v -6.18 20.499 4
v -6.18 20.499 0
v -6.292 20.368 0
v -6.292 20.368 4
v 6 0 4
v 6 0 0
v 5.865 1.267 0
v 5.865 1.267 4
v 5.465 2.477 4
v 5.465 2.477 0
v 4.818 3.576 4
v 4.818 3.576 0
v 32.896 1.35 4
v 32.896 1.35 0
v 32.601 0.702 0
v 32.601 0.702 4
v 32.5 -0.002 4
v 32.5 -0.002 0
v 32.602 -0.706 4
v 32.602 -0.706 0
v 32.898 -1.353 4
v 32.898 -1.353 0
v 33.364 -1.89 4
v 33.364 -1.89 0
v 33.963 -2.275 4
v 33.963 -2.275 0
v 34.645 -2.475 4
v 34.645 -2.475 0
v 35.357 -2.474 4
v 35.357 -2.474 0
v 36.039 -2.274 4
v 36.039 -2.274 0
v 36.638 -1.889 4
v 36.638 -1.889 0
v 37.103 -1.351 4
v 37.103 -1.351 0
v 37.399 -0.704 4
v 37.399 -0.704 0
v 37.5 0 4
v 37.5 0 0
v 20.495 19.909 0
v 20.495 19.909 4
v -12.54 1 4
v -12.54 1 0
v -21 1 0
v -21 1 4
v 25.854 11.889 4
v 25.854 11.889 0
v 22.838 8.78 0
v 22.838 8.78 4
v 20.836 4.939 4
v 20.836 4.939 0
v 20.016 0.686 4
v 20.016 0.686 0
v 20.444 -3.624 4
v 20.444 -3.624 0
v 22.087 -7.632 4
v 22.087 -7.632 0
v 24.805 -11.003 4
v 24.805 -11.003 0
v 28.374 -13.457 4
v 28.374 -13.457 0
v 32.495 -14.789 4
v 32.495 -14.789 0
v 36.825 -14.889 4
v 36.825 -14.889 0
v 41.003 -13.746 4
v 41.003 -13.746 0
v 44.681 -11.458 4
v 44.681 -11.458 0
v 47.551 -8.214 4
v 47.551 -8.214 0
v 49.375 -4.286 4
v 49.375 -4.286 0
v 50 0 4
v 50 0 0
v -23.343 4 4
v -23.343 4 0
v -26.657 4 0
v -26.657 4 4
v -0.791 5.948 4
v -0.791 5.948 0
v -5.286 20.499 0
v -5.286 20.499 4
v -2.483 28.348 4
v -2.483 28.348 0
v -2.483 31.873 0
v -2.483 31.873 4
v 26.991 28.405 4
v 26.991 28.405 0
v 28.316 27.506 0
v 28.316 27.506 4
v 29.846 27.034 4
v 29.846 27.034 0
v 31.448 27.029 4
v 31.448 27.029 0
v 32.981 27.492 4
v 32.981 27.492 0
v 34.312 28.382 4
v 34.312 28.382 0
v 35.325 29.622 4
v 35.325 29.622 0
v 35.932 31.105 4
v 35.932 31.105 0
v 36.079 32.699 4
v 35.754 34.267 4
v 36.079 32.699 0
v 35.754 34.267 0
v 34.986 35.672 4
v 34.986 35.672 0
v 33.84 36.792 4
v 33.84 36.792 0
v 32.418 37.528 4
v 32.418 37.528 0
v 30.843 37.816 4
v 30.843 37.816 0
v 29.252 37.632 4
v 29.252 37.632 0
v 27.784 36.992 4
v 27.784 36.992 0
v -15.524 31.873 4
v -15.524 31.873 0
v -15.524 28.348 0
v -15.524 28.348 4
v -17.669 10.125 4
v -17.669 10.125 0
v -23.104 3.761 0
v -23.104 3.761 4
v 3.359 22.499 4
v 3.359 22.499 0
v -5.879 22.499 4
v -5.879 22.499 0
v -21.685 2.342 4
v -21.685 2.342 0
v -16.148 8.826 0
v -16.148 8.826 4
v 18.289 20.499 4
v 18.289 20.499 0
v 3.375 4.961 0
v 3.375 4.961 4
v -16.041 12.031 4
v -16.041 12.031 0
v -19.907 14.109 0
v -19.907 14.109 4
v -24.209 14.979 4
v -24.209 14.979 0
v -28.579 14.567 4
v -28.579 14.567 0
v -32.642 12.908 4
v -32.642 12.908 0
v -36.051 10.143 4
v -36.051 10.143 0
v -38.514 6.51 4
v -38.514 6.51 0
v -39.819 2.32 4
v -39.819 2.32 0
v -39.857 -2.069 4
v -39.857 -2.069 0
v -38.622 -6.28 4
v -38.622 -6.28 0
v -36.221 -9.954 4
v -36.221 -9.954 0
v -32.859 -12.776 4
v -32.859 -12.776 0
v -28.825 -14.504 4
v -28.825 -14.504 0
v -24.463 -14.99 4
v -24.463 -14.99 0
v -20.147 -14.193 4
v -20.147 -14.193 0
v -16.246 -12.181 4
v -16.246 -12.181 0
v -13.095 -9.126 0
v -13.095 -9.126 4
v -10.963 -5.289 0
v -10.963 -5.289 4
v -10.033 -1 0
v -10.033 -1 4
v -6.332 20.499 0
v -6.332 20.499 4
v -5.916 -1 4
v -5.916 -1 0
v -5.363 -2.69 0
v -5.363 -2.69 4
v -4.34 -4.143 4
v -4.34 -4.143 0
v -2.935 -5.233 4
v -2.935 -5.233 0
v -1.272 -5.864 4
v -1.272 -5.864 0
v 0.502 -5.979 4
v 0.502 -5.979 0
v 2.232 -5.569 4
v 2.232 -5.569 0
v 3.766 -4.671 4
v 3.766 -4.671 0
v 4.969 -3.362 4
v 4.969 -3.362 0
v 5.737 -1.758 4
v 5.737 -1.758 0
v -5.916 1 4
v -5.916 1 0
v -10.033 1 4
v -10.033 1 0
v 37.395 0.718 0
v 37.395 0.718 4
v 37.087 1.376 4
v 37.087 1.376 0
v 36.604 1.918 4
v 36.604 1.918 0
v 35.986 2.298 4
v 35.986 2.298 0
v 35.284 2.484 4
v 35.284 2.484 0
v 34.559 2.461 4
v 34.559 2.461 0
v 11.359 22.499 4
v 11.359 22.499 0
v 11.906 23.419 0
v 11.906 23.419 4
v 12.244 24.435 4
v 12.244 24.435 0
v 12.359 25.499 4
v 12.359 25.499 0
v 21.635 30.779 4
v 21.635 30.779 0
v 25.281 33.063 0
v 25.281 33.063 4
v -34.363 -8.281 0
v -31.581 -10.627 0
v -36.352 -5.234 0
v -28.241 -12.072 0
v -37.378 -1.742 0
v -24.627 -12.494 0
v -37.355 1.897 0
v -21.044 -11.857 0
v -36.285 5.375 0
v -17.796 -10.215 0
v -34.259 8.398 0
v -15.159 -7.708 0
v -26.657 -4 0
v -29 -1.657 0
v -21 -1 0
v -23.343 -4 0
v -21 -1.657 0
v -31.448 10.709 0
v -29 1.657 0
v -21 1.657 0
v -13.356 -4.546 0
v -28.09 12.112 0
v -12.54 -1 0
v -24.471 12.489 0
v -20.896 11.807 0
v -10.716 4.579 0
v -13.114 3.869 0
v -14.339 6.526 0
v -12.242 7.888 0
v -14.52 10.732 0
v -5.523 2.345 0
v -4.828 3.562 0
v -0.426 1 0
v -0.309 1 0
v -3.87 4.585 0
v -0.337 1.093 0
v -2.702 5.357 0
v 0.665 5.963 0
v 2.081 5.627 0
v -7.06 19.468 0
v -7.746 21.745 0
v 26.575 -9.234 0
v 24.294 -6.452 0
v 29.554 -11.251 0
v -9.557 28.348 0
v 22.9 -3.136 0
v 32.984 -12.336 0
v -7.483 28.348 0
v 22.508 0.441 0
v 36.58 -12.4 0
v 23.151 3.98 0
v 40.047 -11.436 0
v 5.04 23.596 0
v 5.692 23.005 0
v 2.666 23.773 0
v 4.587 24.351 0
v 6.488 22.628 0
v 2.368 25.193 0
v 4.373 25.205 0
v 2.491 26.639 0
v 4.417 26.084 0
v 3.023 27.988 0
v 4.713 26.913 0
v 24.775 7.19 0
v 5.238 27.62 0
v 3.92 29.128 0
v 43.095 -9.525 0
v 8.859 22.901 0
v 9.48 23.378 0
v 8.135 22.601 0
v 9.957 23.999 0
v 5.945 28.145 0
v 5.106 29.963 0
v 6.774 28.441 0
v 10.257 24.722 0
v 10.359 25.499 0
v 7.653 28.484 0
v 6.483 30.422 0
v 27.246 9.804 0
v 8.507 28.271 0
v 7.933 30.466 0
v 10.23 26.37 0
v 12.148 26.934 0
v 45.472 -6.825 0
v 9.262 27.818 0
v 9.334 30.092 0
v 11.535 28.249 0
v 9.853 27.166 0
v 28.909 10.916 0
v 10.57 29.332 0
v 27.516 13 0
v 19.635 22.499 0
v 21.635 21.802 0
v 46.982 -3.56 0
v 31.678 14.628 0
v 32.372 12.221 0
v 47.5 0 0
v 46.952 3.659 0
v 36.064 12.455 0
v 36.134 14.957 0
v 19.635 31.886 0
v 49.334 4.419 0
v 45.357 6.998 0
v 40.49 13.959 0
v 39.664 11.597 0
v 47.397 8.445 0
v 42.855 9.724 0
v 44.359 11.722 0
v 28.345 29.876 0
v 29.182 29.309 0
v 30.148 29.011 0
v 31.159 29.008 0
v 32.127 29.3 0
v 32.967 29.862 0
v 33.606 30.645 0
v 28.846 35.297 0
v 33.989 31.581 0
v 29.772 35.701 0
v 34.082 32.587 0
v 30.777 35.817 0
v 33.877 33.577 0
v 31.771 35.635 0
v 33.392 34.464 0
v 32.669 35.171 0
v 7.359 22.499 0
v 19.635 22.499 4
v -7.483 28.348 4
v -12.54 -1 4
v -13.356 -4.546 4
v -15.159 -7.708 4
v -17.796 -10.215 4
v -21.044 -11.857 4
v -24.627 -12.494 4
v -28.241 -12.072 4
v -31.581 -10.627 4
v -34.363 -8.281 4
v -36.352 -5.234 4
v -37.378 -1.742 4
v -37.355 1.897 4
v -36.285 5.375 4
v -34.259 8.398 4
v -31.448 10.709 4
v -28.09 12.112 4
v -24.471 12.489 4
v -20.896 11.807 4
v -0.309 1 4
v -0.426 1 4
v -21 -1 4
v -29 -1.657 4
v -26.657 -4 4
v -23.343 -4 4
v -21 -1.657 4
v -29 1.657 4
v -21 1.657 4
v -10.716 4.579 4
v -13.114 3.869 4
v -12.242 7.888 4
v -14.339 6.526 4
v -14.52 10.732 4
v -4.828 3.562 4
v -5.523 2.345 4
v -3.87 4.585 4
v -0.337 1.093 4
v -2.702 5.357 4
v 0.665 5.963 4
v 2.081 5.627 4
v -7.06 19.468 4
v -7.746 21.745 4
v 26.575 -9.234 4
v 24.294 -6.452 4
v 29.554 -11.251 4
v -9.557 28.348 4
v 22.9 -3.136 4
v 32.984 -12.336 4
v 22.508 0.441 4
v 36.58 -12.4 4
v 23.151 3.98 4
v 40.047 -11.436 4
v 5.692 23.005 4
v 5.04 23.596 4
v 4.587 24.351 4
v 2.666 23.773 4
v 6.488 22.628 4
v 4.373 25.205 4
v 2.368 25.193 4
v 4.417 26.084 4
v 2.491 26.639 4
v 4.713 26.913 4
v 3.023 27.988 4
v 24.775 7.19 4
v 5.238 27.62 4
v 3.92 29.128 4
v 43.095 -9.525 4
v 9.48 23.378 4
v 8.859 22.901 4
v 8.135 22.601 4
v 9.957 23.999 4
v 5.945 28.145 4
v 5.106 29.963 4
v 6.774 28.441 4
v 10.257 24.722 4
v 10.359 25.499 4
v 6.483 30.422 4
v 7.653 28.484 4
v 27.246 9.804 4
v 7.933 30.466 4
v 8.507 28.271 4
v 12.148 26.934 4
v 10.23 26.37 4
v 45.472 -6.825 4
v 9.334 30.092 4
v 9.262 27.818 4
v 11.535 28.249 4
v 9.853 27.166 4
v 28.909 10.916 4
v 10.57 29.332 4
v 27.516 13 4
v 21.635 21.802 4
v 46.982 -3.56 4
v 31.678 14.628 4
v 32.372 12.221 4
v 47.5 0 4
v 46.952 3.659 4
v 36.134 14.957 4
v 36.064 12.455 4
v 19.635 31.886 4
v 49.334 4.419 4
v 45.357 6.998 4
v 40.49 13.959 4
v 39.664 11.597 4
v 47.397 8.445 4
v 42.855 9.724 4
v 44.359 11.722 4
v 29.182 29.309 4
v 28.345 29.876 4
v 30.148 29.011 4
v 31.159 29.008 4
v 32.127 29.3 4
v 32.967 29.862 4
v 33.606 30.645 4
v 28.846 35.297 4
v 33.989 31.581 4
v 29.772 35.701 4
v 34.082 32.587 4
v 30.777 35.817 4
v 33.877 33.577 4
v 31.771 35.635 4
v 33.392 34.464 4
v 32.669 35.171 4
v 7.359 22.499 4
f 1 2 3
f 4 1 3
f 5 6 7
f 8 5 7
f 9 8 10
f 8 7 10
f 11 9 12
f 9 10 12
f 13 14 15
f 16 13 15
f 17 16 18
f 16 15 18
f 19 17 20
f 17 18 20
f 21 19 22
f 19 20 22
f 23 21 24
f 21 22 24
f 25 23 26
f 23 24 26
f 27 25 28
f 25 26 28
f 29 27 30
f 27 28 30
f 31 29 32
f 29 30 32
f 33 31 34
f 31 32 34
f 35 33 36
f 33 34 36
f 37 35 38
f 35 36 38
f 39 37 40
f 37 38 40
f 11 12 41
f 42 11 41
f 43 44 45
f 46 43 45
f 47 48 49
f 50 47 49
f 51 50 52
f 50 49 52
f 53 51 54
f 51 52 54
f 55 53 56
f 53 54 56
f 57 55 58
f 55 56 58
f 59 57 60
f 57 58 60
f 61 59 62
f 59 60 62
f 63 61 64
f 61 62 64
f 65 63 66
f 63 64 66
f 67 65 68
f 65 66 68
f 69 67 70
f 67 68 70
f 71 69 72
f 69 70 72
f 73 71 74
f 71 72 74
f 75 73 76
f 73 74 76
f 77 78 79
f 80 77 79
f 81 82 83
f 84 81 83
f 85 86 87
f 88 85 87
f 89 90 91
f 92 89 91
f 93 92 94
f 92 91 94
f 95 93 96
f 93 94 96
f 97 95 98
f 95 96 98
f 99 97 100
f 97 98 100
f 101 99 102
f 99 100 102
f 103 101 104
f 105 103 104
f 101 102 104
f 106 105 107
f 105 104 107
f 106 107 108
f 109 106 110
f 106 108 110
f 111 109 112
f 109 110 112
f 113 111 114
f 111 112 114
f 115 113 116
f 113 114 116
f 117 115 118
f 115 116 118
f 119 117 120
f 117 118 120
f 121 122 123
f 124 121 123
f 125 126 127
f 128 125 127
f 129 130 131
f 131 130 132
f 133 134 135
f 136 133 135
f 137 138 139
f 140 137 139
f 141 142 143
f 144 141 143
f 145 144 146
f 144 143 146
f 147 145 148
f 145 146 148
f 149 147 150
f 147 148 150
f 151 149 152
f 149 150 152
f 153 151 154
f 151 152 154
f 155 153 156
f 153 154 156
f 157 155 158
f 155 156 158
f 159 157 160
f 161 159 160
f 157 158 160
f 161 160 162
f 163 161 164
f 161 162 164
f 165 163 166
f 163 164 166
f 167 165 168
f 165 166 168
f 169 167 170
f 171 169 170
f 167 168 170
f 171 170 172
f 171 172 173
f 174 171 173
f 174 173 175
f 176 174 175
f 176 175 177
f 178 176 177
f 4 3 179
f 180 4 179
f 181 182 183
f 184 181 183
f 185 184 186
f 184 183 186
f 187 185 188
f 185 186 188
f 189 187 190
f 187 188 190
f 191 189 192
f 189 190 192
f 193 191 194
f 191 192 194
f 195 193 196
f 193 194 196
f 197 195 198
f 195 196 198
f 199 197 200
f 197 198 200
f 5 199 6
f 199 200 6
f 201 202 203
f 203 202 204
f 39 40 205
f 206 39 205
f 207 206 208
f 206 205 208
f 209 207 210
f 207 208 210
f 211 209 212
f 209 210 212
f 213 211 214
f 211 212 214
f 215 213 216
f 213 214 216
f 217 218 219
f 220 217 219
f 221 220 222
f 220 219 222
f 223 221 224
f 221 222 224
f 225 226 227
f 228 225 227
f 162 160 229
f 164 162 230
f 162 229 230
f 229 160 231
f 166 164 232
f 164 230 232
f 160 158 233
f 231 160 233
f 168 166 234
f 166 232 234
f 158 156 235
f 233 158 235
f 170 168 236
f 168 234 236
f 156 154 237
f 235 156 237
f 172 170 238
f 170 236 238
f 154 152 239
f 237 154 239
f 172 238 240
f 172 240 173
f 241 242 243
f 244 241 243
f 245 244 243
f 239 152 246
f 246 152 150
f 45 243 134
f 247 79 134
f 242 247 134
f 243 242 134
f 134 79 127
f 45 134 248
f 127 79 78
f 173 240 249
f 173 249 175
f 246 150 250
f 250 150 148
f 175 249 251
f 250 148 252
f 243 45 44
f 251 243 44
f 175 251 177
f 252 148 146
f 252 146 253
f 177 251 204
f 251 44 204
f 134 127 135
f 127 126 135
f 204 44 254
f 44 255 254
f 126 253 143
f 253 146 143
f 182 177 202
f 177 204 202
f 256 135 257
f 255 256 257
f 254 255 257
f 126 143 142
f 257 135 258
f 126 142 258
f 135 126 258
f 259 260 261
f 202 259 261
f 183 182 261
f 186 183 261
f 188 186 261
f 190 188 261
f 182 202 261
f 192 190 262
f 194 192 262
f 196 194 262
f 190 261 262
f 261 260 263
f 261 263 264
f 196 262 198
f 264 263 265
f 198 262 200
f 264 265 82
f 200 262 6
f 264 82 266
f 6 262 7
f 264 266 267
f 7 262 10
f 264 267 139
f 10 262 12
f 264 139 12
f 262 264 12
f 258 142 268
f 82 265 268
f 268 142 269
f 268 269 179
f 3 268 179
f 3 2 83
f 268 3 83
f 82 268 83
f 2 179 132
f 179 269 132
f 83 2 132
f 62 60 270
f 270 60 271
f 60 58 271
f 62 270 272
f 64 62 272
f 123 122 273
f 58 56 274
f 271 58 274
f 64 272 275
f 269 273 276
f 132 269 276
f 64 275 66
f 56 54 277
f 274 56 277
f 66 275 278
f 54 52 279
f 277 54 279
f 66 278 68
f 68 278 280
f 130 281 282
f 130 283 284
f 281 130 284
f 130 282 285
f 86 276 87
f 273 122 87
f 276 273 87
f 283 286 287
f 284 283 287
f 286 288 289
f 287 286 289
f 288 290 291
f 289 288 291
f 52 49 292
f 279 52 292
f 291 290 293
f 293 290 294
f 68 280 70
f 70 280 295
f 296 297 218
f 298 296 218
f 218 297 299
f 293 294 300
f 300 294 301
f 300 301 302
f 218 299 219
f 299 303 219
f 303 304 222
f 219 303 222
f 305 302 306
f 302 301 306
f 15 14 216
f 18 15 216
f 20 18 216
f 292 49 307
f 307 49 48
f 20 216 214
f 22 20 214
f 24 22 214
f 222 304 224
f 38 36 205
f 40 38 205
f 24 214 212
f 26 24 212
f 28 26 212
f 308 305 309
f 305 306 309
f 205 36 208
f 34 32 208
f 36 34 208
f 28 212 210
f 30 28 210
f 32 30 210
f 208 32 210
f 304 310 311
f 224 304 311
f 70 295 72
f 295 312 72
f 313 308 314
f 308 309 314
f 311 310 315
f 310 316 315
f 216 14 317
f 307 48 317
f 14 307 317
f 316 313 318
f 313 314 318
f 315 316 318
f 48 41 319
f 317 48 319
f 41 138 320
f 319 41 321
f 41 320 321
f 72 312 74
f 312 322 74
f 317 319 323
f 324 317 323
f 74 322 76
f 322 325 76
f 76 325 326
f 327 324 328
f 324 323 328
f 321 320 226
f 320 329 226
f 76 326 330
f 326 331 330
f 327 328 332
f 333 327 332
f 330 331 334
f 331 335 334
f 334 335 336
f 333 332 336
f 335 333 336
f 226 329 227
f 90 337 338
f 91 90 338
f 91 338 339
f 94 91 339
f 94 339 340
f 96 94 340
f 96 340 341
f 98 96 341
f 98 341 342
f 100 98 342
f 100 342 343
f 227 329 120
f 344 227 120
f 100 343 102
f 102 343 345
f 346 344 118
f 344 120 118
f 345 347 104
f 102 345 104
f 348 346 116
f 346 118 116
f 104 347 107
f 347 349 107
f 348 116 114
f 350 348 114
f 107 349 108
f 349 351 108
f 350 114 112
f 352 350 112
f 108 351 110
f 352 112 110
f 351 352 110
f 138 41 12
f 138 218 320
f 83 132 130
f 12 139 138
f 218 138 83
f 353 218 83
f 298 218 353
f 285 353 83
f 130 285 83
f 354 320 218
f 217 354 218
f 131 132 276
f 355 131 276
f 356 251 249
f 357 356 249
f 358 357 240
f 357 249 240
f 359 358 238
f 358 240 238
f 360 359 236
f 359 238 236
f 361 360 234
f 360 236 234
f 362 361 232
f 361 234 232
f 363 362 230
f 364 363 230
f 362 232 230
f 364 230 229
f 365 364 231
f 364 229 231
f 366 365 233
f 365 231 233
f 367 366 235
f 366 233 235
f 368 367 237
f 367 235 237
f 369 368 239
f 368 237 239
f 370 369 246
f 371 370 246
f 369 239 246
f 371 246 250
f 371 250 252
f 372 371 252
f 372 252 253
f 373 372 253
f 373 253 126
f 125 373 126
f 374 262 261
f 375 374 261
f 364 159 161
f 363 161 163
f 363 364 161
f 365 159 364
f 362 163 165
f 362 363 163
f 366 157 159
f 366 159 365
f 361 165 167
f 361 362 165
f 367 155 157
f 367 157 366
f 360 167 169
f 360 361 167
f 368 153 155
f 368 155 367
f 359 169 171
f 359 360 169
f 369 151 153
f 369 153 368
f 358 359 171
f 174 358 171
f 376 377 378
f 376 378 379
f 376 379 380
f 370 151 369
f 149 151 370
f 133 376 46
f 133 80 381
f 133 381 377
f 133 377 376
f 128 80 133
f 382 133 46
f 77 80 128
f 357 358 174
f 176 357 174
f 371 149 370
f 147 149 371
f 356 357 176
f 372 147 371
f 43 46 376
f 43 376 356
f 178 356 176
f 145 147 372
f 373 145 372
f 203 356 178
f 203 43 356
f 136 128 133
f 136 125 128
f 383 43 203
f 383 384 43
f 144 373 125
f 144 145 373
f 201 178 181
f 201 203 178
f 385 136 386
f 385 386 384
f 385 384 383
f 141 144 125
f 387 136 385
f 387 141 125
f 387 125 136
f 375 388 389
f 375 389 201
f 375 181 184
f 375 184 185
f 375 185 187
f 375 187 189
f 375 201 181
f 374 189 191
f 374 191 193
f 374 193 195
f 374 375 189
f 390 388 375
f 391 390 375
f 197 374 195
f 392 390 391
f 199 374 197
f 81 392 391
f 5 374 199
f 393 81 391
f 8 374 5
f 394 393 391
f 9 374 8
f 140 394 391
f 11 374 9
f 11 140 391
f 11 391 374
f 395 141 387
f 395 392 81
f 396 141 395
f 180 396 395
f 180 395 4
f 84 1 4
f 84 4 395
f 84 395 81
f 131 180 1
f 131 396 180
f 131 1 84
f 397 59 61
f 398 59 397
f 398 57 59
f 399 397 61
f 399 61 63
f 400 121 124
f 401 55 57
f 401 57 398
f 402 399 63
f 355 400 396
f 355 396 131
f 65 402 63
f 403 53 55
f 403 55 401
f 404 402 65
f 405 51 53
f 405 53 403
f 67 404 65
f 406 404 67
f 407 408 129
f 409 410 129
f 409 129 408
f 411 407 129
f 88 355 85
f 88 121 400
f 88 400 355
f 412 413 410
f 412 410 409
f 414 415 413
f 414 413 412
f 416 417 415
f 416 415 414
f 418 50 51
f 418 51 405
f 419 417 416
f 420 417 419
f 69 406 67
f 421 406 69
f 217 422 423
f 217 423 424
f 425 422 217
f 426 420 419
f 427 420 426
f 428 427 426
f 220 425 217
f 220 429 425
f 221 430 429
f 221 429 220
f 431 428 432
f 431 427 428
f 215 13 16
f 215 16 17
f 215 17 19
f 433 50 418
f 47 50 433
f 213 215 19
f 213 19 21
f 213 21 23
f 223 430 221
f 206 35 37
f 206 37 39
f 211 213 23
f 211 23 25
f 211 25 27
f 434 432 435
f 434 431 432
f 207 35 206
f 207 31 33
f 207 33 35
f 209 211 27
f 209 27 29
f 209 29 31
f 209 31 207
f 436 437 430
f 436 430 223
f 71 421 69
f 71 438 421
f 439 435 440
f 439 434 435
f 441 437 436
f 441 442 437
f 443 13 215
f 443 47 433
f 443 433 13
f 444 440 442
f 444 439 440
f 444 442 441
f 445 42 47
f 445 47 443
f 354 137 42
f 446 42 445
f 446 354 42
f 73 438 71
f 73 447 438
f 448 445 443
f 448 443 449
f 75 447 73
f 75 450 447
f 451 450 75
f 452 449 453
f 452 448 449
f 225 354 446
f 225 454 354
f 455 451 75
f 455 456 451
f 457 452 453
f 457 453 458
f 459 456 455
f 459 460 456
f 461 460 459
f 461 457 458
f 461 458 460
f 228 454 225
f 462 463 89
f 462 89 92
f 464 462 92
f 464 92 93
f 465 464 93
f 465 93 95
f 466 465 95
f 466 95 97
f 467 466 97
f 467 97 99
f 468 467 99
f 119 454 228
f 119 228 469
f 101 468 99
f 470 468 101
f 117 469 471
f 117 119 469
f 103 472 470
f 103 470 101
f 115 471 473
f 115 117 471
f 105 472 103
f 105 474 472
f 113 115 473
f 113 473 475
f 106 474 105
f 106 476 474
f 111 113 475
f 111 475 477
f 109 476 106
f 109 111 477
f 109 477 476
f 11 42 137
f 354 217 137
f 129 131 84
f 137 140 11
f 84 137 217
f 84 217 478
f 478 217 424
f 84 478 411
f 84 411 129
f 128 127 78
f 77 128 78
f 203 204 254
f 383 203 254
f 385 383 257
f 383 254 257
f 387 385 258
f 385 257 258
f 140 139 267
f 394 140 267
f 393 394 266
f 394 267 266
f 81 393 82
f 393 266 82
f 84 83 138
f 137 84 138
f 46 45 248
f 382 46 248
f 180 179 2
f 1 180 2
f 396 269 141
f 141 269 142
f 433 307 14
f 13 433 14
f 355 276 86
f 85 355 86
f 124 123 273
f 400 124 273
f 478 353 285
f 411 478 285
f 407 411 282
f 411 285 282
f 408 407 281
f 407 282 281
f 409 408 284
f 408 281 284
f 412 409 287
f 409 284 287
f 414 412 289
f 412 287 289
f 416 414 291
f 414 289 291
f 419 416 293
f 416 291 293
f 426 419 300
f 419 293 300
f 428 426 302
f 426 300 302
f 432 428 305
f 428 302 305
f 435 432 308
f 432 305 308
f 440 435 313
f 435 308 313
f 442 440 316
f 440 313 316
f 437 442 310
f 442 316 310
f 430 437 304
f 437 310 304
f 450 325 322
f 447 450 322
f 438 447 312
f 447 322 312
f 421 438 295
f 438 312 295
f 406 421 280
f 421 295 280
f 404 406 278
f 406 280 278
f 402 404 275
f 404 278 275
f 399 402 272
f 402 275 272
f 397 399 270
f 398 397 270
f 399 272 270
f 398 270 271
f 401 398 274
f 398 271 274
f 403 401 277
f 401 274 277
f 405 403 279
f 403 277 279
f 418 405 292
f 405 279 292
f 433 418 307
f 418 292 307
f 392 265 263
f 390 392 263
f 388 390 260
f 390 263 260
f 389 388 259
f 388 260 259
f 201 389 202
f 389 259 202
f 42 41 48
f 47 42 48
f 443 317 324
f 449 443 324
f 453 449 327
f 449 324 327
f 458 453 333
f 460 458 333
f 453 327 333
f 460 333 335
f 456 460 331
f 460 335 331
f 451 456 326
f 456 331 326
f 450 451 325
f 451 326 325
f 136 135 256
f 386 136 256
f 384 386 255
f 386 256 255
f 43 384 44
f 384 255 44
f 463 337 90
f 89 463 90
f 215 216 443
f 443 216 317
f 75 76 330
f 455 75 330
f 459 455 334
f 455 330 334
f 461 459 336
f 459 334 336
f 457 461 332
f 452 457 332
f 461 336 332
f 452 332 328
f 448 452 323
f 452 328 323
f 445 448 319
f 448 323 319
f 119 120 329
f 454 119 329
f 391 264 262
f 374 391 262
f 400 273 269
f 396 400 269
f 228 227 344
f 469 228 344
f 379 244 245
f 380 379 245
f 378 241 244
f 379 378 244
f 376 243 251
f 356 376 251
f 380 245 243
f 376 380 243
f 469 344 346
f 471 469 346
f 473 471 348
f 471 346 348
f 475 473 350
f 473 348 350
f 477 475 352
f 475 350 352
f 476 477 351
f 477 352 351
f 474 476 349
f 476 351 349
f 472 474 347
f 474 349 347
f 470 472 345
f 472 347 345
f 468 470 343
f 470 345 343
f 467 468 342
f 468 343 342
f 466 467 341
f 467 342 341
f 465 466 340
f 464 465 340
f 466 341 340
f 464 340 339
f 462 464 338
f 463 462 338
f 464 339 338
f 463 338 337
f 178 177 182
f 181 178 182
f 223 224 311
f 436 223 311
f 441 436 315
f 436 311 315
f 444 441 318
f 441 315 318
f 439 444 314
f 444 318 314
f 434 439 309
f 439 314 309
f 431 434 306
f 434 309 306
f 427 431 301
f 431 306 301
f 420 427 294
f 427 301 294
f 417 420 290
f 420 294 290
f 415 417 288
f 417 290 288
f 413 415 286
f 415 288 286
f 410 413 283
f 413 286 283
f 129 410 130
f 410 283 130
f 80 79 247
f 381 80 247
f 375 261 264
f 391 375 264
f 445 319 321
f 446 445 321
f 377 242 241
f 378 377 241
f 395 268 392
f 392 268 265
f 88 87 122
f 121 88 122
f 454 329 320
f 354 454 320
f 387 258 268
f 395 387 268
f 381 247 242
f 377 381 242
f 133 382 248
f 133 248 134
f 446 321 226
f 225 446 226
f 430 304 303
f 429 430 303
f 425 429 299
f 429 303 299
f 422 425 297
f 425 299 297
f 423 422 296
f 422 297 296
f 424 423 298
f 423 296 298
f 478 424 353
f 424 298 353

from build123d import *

# Parameters (mm, degrees)
F1_DEPTH = 4


with BuildPart() as f1:
    # F0 (on Top) → F1 (new body)
    with BuildSketch(Plane.XY):
        Polygon((-15.5243815389, 28.3477026969), (-9.5569409153, 28.3477026969), (-8.5199938287, 28.3477026969), (-7.4830467421, 28.3477026969), (-2.4825821165, 28.3477026969), (-2.4825821165, 31.8725127727), (-15.5243815389, 31.8725127727), align=None)
        with BuildLine():
            Line((7.3588635176, 22.4989129454), (11.3588635176, 22.4989129454))
            ThreePointArc((11.3588635176, 22.4989129454), (12.1022800079, 23.9177741153), (12.3588635176, 25.4989129454))
            ThreePointArc((12.3588635176, 25.4989129454), (5.7777246876, 30.2423294356), (3.3588635176, 22.4989129454))
            Line((3.3588635176, 22.4989129454), (7.3588635176, 22.4989129454))
        make_face()
        with BuildLine():
            ThreePointArc((10.3588635176, 25.4989129454), (9.4801838612, 23.3775926018), (7.3588635176, 22.4989129454))
            ThreePointArc((7.3588635176, 22.4989129454), (5.2375431741, 27.6202332889), (10.3588635176, 25.4989129454))
        make_face(mode=Mode.SUBTRACT)
        Polygon((21.6349155158, 22.5854356274), (21.5552828644, 22.4989129454), (21.6349155158, 22.4989129454), align=None)
        with BuildLine():
            Line((-10.0333704529, -1), (-5.9160797831, -1))
            ThreePointArc((-5.9160797831, -1), (-5.9789831367, -0.5017575617), (-6, 0))
            Line((-6, 0), (-10, 0))
            ThreePointArc((-10, 0), (-10.0083449345, -0.5002783193), (-10.0333704529, -1))
        make_face()
        with BuildLine():
            Line((27.2461703771, 9.8044952026), (25.8535279477, 11.8887362237))
            ThreePointArc((25.8535279477, 11.8887362237), (28.3741823442, -13.4572857736), (50, 0))
            ThreePointArc((50, 0), (42.508229605, 12.9856262151), (27.5164682401, 12.9998750917))
            Line((27.5164682401, 12.9998750917), (28.9091106695, 10.9156340706))
            ThreePointArc((28.9091106695, 10.9156340706), (41.3290553548, 10.7792883956), (47.5, 0))
            ThreePointArc((47.5, 0), (29.5535732029, -11.2510637339), (27.2461703771, 9.8044952026))
        make_face()
        with BuildLine():
            ThreePointArc((-16.0413098576, 12.0308715783), (-38.621899063, -6.2804351694), (-10.0333704529, -1))
            Line((-10.0333704529, -1), (-12.5400642056, -1))
            ThreePointArc((-12.5400642056, -1), (-36.3515825525, -5.2336959745), (-17.6691263456, 10.1246378436))
            Line((-17.6691263456, 10.1246378436), (-16.0413098576, 12.0308715783))
        make_face()
        with BuildLine():
            ThreePointArc((27.7840541056, 36.9915858101), (26.5245000959, 35.9002763927), (25.655754026, 34.4780553079))
            ThreePointArc((25.655754026, 34.4780553079), (25.4205728544, 33.7833933402), (25.2812581995, 33.0633538552))
            Line((25.2812581995, 33.0633538552), (28.8459285816, 35.2967635194))
            ThreePointArc((28.8459285816, 35.2967635194), (34.0729543544, 32.0804769566), (28.3451517253, 29.8762594705))
            Line((28.3451517253, 29.8762594705), (26.9907459113, 28.404666833))
            ThreePointArc((26.9907459113, 28.404666833), (36.0644734943, 31.8964891433), (27.7840541056, 36.9915858101))
        make_face()
        with BuildLine():
            Line((-5.6809818921, 21.7788360929), (-5.5945120398, 21.4989129454))
            Line((-5.5945120398, 21.4989129454), (4.3588635176, 21.4989129454))
            ThreePointArc((4.3588635176, 21.4989129454), (3.8233296117, 21.9633790395), (3.3588635176, 22.4989129454))
            Line((3.3588635176, 22.4989129454), (-5.8785236087, 22.4989129454))
            Line((-5.8785236087, 22.4989129454), (-5.6809818921, 21.7788360928))
        make_face()
        with BuildLine():
            Line((19.6349155158, 22.4989129454), (20.6349155158, 22.4989129454))
            Line((20.6349155158, 22.4989129454), (20.6349155158, 31.3322976225))
            Line((20.6349155158, 31.3322976225), (25.655754026, 34.4780553079))
            ThreePointArc((25.655754026, 34.4780553079), (26.5245000959, 35.9002763927), (27.7840541056, 36.9915858101))
            Line((27.7840541056, 36.9915858101), (19.6349155158, 31.8858220424))
            Line((19.6349155158, 31.8858220424), (19.6349155158, 22.4989129454))
        make_face()
        Polygon((20.1004037621, 20.4989129454), (20.4947406927, 19.9087447948), (21.0611911899, 20.4989129454), align=None)
        with BuildLine():
            ThreePointArc((4.1547675399, 4.3287303784), (4.5022097097, 3.9661199843), (4.8181111042, 3.5757244564))
            Line((4.8181111042, 3.5757244564), (20.4947406927, 19.9087447948))
            Line((20.4947406927, 19.9087447948), (20.1004037621, 20.4989129454))
            Line((20.1004037621, 20.4989129454), (19.6751034747, 20.4989129454))
            Line((19.6751034747, 20.4989129454), (4.1547675399, 4.3287303784))
        make_face()
        with BuildLine():
            ThreePointArc((27.5164682401, 12.9998750917), (27.0870611681, 12.7430529718), (26.6664584903, 12.472052193))
            Line((26.6664584903, 12.472052193), (28.0553820752, 10.3933768275))
            ThreePointArc((28.0553820752, 10.3933768275), (28.4770175144, 10.6630530099), (28.9091106695, 10.9156340706))
            Line((28.9091106695, 10.9156340706), (27.5164682401, 12.9998750917))
        make_face()
        with BuildLine():
            ThreePointArc((26.6664584903, 12.472052193), (26.2551281935, 12.1871742864), (25.8535279477, 11.8887362237))
            Line((25.8535279477, 11.8887362237), (27.2461703771, 9.8044952026))
            ThreePointArc((27.2461703771, 9.8044952026), (27.6448803225, 10.1070378712), (28.0553820752, 10.3933768275))
            Line((28.0553820752, 10.3933768275), (26.6664584903, 12.472052193))
        make_face()
        with BuildLine():
            Line((21.0611911899, 20.4989129454), (20.4947406927, 19.9087447948))
            Line((20.4947406927, 19.9087447948), (25.8535279477, 11.8887362237))
            ThreePointArc((25.8535279477, 11.8887362237), (26.2551281935, 12.1871742864), (26.6664584903, 12.472052193))
            Line((26.6664584903, 12.472052193), (21.3030927637, 20.4989129454))
            Line((21.3030927637, 20.4989129454), (21.0611911899, 20.4989129454))
        make_face()
        with BuildLine():
            ThreePointArc((-15.2591821222, 11.4068605265), (-15.6450415555, 11.7253892261), (-16.0413098576, 12.0308715783))
            Line((-16.0413098576, 12.0308715783), (-17.6691263456, 10.1246378436))
            ThreePointArc((-17.6691263456, 10.1246378436), (-17.2696924008, 9.8230516858), (-16.8826517685, 9.5057171054))
            Line((-16.8826517685, 9.5057171054), (-15.2591821222, 11.4068605265))
        make_face()
        with BuildLine():
            Line((-12.5400642056, -1), (-10.0333704529, -1))
            ThreePointArc((-10.0333704529, -1), (-10.0083449345, -0.5002783193), (-10, 0))
            Line((-10, 0), (-12.5, 0))
            ThreePointArc((-12.5, 0), (-12.5100200675, -0.5004011242), (-12.5400642056, -1))
        make_face()
        Polygon((-6.6411364824, 21.4989129454), (-5.5945120398, 21.4989129454), (-5.6809818921, 21.7788360929), (-5.8785236087, 22.4989129454), (-7.4830467421, 28.3477026969), (-8.5199938287, 28.3477026969), align=None)
        with BuildLine():
            Line((4.3588635176, 21.4989129454), (10.3588635176, 21.4989129454))
            ThreePointArc((10.3588635176, 21.4989129454), (10.8943974236, 21.9633790395), (11.3588635176, 22.4989129454))
            Line((11.3588635176, 22.4989129454), (7.3588635176, 22.4989129454))
            Line((7.3588635176, 22.4989129454), (3.3588635176, 22.4989129454))
            ThreePointArc((3.3588635176, 22.4989129454), (3.8233296117, 21.9633790395), (4.3588635176, 21.4989129454))
        make_face()
        with BuildLine():
            Line((10.3588635176, 21.4989129454), (19.2488278006, 21.4989129454))
            Line((19.2488278006, 21.4989129454), (19.6349155158, 21.9011664061))
            Line((19.6349155158, 21.9011664061), (19.6349155158, 22.4989129454))
            Line((19.6349155158, 22.4989129454), (11.3588635176, 22.4989129454))
            ThreePointArc((11.3588635176, 22.4989129454), (10.8943974236, 21.9633790395), (10.3588635176, 21.4989129454))
        make_face()
        with BuildLine():
            Line((-7.7456900513, 21.7453513374), (-16.0413098576, 12.0308715783))
            ThreePointArc((-16.0413098576, 12.0308715783), (-15.6450415555, 11.7253892261), (-15.2591821222, 11.4068605265))
            Line((-15.2591821222, 11.4068605265), (-7.4097298942, 20.5988614343))
            Line((-7.4097298942, 20.5988614343), (-6.6411364824, 21.4989129454))
            Line((-6.6411364824, 21.4989129454), (-8.5199938287, 28.3477026969))
            Line((-8.5199938287, 28.3477026969), (-9.5569409153, 28.3477026969))
            Line((-9.5569409153, 28.3477026969), (-7.7456900513, 21.7453513374))
        make_face()
        Polygon((19.6349155158, 21.4989129454), (20.6349155158, 21.4989129454), (20.6349155158, 22.4989129454), (19.6349155158, 22.4989129454), (19.6349155158, 21.9011664061), align=None)
        with BuildLine():
            Line((20.6349155158, 31.3322976225), (20.6349155158, 22.4989129454))
            Line((20.6349155158, 22.4989129454), (21.5552828644, 22.4989129454))
            Line((21.5552828644, 22.4989129454), (21.6349155158, 22.5854356274))
            Line((21.6349155158, 22.5854356274), (21.6349155158, 30.7787732025))
            Line((21.6349155158, 30.7787732025), (25.2812581995, 33.0633538552))
            ThreePointArc((25.2812581995, 33.0633538552), (25.4205728544, 33.7833933402), (25.655754026, 34.4780553079))
            Line((25.655754026, 34.4780553079), (20.6349155158, 31.3322976225))
        make_face()
        with BuildLine():
            ThreePointArc((-5.9160797831, -1), (0.5017575617, -5.9789831367), (6, 0))
            ThreePointArc((6, 0), (5.6968704841, 1.8829940753), (4.8181111042, 3.5757244564))
            ThreePointArc((4.8181111042, 3.5757244564), (4.5022097097, 3.9661199843), (4.1547675399, 4.3287303784))
            Line((4.1547675399, 4.3287303784), (0.7917937299, 0.824946652))
            Line((0.7917937299, 0.824946652), (0, 0))
            Line((0, 0), (-1.0466244425, 0))
            Line((-1.0466244425, 0), (-6, 0))
            ThreePointArc((-6, 0), (-5.9789831367, -0.5017575617), (-5.9160797831, -1))
        make_face()
        with BuildLine():
            Line((21.3030927637, 20.4989129454), (26.6664584903, 12.472052193))
            ThreePointArc((26.6664584903, 12.472052193), (27.0870611681, 12.7430529718), (27.5164682401, 12.9998750917))
            Line((27.5164682401, 12.9998750917), (21.6349155158, 21.8022591043))
            Line((21.6349155158, 21.8022591043), (21.6349155158, 22.4989129454))
            Line((21.6349155158, 22.4989129454), (21.5552828644, 22.4989129454))
            Line((21.5552828644, 22.4989129454), (20.6349155158, 21.4989129454))
            Line((20.6349155158, 21.4989129454), (21.2038088624, 20.6475021133))
            Line((21.2038088624, 20.6475021133), (21.3030927637, 20.4989129454))
        make_face()
        with BuildLine():
            Line((-12.5400642056, 1), (-10.0333704529, 1))
            ThreePointArc((-10.0333704529, 1), (-11.378100937, 6.2804351694), (-14.5203951207, 10.7320958612))
            Line((-14.5203951207, 10.7320958612), (-16.1482116088, 8.8258621265))
            ThreePointArc((-16.1482116088, 8.8258621265), (-13.6484174475, 5.2336959745), (-12.5400642056, 1))
        make_face()
        with BuildLine():
            ThreePointArc((-16.1482116088, 8.8258621265), (-16.5086249566, 9.1731428568), (-16.8826517685, 9.5057171054))
            Line((-16.8826517685, 9.5057171054), (-22.3944001818, 3.0512544313))
            Line((-22.3944001818, 3.0512544313), (-21.6851024654, 2.3419567149))
            Line((-21.6851024654, 2.3419567149), (-16.1482116088, 8.8258621265))
        make_face()
        with BuildLine():
            ThreePointArc((-16.8826517685, 9.5057171054), (-17.2696924008, 9.8230516858), (-17.6691263456, 10.1246378436))
            Line((-17.6691263456, 10.1246378436), (-23.1036978982, 3.7605521477))
            Line((-23.1036978982, 3.7605521477), (-22.3944001818, 3.0512544313))
            Line((-22.3944001818, 3.0512544313), (-16.8826517685, 9.5057171054))
        make_face()
        Polygon((-21, -1.6568542495), (-21, -1), (-21, 0), (-23.6850018929, 0), (-25, 0), (-24.1460561953, 1), (-22.3944001818, 3.0512544313), (-23.1036978982, 3.7605521477), (-23.3431457505, 4), (-26.6568542495, 4), (-29, 1.6568542495), (-29, -1.6568542495), (-26.6568542495, -4), (-23.3431457505, -4), align=None)
        Polygon((-21.6851024654, 2.3419567149), (-22.3944001818, 3.0512544313), (-24.1460561953, 1), (-22.8310580882, 1), align=None)
        Polygon((-25, 0), (-23.6850018929, 0), (-22.8310580882, 1), (-24.1460561953, 1), align=None)
        Polygon((-23.6850018929, 0), (-21, 0), (-21, 1), (-22.8310580882, 1), align=None)
        with BuildLine():
            Line((-21, 0), (-12.5, 0))
            ThreePointArc((-12.5, 0), (-12.5100200675, 0.5004011242), (-12.5400642056, 1))
            Line((-12.5400642056, 1), (-21, 1))
            Line((-21, 1), (-21, 0))
        make_face()
        with BuildLine():
            Line((-21, -1), (-12.5400642056, -1))
            ThreePointArc((-12.5400642056, -1), (-12.5100200675, -0.5004011242), (-12.5, 0))
            Line((-12.5, 0), (-21, 0))
            Line((-21, 0), (-21, -1))
        make_face()
        with BuildLine():
            ThreePointArc((-2.7015523213, 5.3573888281), (-4.8283128649, 3.561936956), (-5.9160797831, 1))
            Line((-5.9160797831, 1), (-1.35553013, 1))
            Line((-1.35553013, 1), (-2.7015523213, 5.3573888281))
        make_face()
        with BuildLine():
            ThreePointArc((-5.9160797831, 1), (-5.9789831367, 0.5017575617), (-6, 0))
            Line((-6, 0), (-1.0466244425, 0))
            Line((-1.0466244425, 0), (-1.1292765039, 0.2675640649))
            Line((-1.1292765039, 0.2675640649), (-1.35553013, 1))
            Line((-1.35553013, 1), (-5.9160797831, 1))
        make_face()
        with BuildLine():
            Line((-10, 0), (-6, 0))
            ThreePointArc((-6, 0), (-5.9789831367, 0.5017575617), (-5.9160797831, 1))
            Line((-5.9160797831, 1), (-10.0333704529, 1))
            ThreePointArc((-10.0333704529, 1), (-10.0083449345, 0.5002783193), (-10, 0))
        make_face()
        with BuildLine():
            Line((-12.5, 0), (-10, 0))
            ThreePointArc((-10, 0), (-10.0083449345, 0.5002783193), (-10.0333704529, 1))
            Line((-10.0333704529, 1), (-12.5400642056, 1))
            ThreePointArc((-12.5400642056, 1), (-12.5100200675, 0.5004011242), (-12.5, 0))
        make_face()
        with BuildLine():
            Line((0.4543109559, 1.917457369), (3.375200978, 4.9606469697))
            ThreePointArc((3.375200978, 4.9606469697), (1.3833066376, 5.8383613066), (-0.790647207, 5.947678286))
            Line((-0.790647207, 5.947678286), (0.4543109559, 1.917457369))
        make_face()
        with BuildLine():
            Line((0.4543109559, 1.917457369), (-0.790647207, 5.947678286))
            ThreePointArc((-0.790647207, 5.947678286), (-1.285259812, 5.8607258267), (-1.7708683738, 5.7327153429))
            Line((-1.7708683738, 5.7327153429), (-0.337482774, 1.0925107169))
            Line((-0.337482774, 1.0925107169), (0.4543109559, 1.917457369))
        make_face()
        with BuildLine():
            ThreePointArc((-1.7708683738, 5.7327153429), (-2.2440709028, 5.5645436276), (-2.7015523213, 5.3573888281))
            Line((-2.7015523213, 5.3573888281), (-1.35553013, 1))
            Line((-1.35553013, 1), (-0.4262756741, 1))
            Line((-0.4262756741, 1), (-0.337482774, 1.0925107169))
            Line((-0.337482774, 1.0925107169), (-1.7708683738, 5.7327153429))
        make_face()
        with BuildLine():
            Line((0.7917937299, 0.824946652), (4.1547675399, 4.3287303784))
            ThreePointArc((4.1547675399, 4.3287303784), (3.7782186431, 4.6610153277), (3.375200978, 4.9606469697))
            Line((3.375200978, 4.9606469697), (0.4543109559, 1.917457369))
            Line((0.4543109559, 1.917457369), (0.7917937299, 0.824946652))
        make_face()
        with BuildLine():
            ThreePointArc((3.375200978, 4.9606469697), (3.7782186431, 4.6610153277), (4.1547675399, 4.3287303784))
            Line((4.1547675399, 4.3287303784), (19.6751034747, 20.4989129454))
            Line((19.6751034747, 20.4989129454), (18.2890157595, 20.4989129454))
            Line((18.2890157595, 20.4989129454), (3.375200978, 4.9606469697))
        make_face()
        with BuildLine():
            Line((-7.4097298942, 20.5988614343), (-15.2591821222, 11.4068605265))
            ThreePointArc((-15.2591821222, 11.4068605265), (-14.8841608872, 11.0756398932), (-14.5203951207, 10.7320958612))
            Line((-14.5203951207, 10.7320958612), (-7.060406618, 19.4680202412))
            Line((-7.060406618, 19.4680202412), (-7.4097298942, 20.5988614343))
        make_face()
        with BuildLine():
            ThreePointArc((-14.5203951207, 10.7320958612), (-14.8841608872, 11.0756398932), (-15.2591821222, 11.4068605265))
            Line((-15.2591821222, 11.4068605265), (-16.8826517685, 9.5057171054))
            ThreePointArc((-16.8826517685, 9.5057171054), (-16.5086249566, 9.1731428568), (-16.1482116088, 8.8258621265))
            Line((-16.1482116088, 8.8258621265), (-14.5203951207, 10.7320958612))
        make_face()
        Polygon((-6.18008218, 20.4989129454), (-5.2856063524, 20.4989129454), (-5.5945120398, 21.4989129454), (-6.6411364824, 21.4989129454), (-6.3322307949, 20.4989129454), align=None)
        Polygon((-7.4097298942, 20.5988614343), (-7.060406618, 19.4680202412), (-6.2918132062, 20.3680717523), (-6.3322307949, 20.4989129454), (-6.6411364824, 21.4989129454), align=None)
        with BuildLine():
            Line((-5.5945120398, 21.4989129454), (-5.2856063524, 20.4989129454))
            Line((-5.2856063524, 20.4989129454), (7.3588635176, 20.4989129454))
            ThreePointArc((7.3588635176, 20.4989129454), (5.7777246876, 20.7554964551), (4.3588635176, 21.4989129454))
            Line((4.3588635176, 21.4989129454), (-5.5945120398, 21.4989129454))
        make_face()
        Polygon((18.2890157595, 20.4989129454), (19.6751034747, 20.4989129454), (19.9258473461, 20.7601556269), (20.6349155158, 21.4989129454), (19.6349155158, 21.4989129454), (19.2488278006, 21.4989129454), align=None)
        Polygon((19.9258473461, 20.7601556269), (20.1004037621, 20.4989129454), (21.0611911899, 20.4989129454), (21.2038088624, 20.6475021133), (20.6349155158, 21.4989129454), align=None)
        Polygon((21.2038088624, 20.6475021133), (21.0611911899, 20.4989129454), (21.3030927637, 20.4989129454), align=None)
        Polygon((19.9258473461, 20.7601556269), (19.6751034747, 20.4989129454), (20.1004037621, 20.4989129454), align=None)
        Polygon((19.6349155158, 21.9011664061), (19.2488278006, 21.4989129454), (19.6349155158, 21.4989129454), align=None)
        Polygon((-0.4262756741, 1), (-1.35553013, 1), (-1.1292765039, 0.2675640649), align=None)
        Polygon((-1.1292765039, 0.2675640649), (-1.0466244425, 0), (0, 0), (-0.3089056874, 1), (-0.4262756741, 1), align=None)
        Polygon((0, 0), (0.7917937299, 0.824946652), (0.4543109559, 1.917457369), (-0.337482774, 1.0925107169), (-0.3089056874, 1), align=None)
        Polygon((-22.8310580882, 1), (-21, 1), (-21, 1.6568542495), (-21.6851024654, 2.3419567149), align=None)
        with BuildLine():
            ThreePointArc((28.9091106695, 10.9156340706), (28.4770175144, 10.6630530099), (28.0553820752, 10.3933768275))
            Line((28.0553820752, 10.3933768275), (33.611076415, 2.0786753655))
            ThreePointArc((33.611076415, 2.0786753655), (34.0650673578, 2.3185989206), (34.5585006537, 2.4607068755))
            Line((34.5585006537, 2.4607068755), (28.9091106695, 10.9156340706))
        make_face()
        with BuildLine():
            ThreePointArc((28.0553820752, 10.3933768275), (27.6448803225, 10.1070378712), (27.2461703771, 9.8044952026))
            Line((27.2461703771, 9.8044952026), (32.8955603613, 1.3495680076))
            ThreePointArc((32.8955603613, 1.3495680076), (33.2156805112, 1.7510579551), (33.611076415, 2.0786753655))
            Line((33.611076415, 2.0786753655), (28.0553820752, 10.3933768275))
        make_face()
        with BuildLine():
            ThreePointArc((33.611076415, 2.0786753655), (33.2156805112, 1.7510579551), (32.8955603613, 1.3495680076))
            ThreePointArc((32.8955603613, 1.3495680076), (34.2968282915, -2.3990726434), (37.5, 0))
            ThreePointArc((37.5, 0), (36.6040965735, 1.9175177138), (34.5585006537, 2.4607068755))
            ThreePointArc((34.5585006537, 2.4607068755), (34.0650673578, 2.3185989206), (33.611076415, 2.0786753655))
        make_face()
        with BuildLine():
            Line((-7.060406618, 19.4680202412), (-2.7015523213, 5.3573888281))
            ThreePointArc((-2.7015523213, 5.3573888281), (-2.2440709028, 5.5645436276), (-1.7708683738, 5.7327153429))
            Line((-1.7708683738, 5.7327153429), (-6.2918132062, 20.3680717523))
            Line((-6.2918132062, 20.3680717523), (-7.060406618, 19.4680202412))
        make_face()
        with BuildLine():
            ThreePointArc((-1.7708683738, 5.7327153429), (-1.285259812, 5.8607258267), (-0.790647207, 5.947678286))
            Line((-0.790647207, 5.947678286), (-5.2856063524, 20.4989129454))
            Line((-5.2856063524, 20.4989129454), (-6.18008218, 20.4989129454))
            Line((-6.18008218, 20.4989129454), (-6.2918132062, 20.3680717523))
            Line((-6.2918132062, 20.3680717523), (-1.7708683738, 5.7327153429))
        make_face()
        with BuildLine():
            ThreePointArc((4.3588635176, 21.4989129454), (5.7777246876, 20.7554964551), (7.3588635176, 20.4989129454))
            ThreePointArc((7.3588635176, 20.4989129454), (8.9400023477, 20.7554964551), (10.3588635176, 21.4989129454))
            Line((10.3588635176, 21.4989129454), (4.3588635176, 21.4989129454))
        make_face()
        with BuildLine():
            Line((7.3588635176, 20.4989129454), (18.2890157595, 20.4989129454))
            Line((18.2890157595, 20.4989129454), (19.2488278006, 21.4989129454))
            Line((19.2488278006, 21.4989129454), (10.3588635176, 21.4989129454))
            ThreePointArc((10.3588635176, 21.4989129454), (8.9400023477, 20.7554964551), (7.3588635176, 20.4989129454))
        make_face()
        Polygon((20.6349155158, 22.4989129454), (20.6349155158, 21.4989129454), (21.5552828644, 22.4989129454), align=None)
    extrude(amount=F1_DEPTH)


solid = f1.part
